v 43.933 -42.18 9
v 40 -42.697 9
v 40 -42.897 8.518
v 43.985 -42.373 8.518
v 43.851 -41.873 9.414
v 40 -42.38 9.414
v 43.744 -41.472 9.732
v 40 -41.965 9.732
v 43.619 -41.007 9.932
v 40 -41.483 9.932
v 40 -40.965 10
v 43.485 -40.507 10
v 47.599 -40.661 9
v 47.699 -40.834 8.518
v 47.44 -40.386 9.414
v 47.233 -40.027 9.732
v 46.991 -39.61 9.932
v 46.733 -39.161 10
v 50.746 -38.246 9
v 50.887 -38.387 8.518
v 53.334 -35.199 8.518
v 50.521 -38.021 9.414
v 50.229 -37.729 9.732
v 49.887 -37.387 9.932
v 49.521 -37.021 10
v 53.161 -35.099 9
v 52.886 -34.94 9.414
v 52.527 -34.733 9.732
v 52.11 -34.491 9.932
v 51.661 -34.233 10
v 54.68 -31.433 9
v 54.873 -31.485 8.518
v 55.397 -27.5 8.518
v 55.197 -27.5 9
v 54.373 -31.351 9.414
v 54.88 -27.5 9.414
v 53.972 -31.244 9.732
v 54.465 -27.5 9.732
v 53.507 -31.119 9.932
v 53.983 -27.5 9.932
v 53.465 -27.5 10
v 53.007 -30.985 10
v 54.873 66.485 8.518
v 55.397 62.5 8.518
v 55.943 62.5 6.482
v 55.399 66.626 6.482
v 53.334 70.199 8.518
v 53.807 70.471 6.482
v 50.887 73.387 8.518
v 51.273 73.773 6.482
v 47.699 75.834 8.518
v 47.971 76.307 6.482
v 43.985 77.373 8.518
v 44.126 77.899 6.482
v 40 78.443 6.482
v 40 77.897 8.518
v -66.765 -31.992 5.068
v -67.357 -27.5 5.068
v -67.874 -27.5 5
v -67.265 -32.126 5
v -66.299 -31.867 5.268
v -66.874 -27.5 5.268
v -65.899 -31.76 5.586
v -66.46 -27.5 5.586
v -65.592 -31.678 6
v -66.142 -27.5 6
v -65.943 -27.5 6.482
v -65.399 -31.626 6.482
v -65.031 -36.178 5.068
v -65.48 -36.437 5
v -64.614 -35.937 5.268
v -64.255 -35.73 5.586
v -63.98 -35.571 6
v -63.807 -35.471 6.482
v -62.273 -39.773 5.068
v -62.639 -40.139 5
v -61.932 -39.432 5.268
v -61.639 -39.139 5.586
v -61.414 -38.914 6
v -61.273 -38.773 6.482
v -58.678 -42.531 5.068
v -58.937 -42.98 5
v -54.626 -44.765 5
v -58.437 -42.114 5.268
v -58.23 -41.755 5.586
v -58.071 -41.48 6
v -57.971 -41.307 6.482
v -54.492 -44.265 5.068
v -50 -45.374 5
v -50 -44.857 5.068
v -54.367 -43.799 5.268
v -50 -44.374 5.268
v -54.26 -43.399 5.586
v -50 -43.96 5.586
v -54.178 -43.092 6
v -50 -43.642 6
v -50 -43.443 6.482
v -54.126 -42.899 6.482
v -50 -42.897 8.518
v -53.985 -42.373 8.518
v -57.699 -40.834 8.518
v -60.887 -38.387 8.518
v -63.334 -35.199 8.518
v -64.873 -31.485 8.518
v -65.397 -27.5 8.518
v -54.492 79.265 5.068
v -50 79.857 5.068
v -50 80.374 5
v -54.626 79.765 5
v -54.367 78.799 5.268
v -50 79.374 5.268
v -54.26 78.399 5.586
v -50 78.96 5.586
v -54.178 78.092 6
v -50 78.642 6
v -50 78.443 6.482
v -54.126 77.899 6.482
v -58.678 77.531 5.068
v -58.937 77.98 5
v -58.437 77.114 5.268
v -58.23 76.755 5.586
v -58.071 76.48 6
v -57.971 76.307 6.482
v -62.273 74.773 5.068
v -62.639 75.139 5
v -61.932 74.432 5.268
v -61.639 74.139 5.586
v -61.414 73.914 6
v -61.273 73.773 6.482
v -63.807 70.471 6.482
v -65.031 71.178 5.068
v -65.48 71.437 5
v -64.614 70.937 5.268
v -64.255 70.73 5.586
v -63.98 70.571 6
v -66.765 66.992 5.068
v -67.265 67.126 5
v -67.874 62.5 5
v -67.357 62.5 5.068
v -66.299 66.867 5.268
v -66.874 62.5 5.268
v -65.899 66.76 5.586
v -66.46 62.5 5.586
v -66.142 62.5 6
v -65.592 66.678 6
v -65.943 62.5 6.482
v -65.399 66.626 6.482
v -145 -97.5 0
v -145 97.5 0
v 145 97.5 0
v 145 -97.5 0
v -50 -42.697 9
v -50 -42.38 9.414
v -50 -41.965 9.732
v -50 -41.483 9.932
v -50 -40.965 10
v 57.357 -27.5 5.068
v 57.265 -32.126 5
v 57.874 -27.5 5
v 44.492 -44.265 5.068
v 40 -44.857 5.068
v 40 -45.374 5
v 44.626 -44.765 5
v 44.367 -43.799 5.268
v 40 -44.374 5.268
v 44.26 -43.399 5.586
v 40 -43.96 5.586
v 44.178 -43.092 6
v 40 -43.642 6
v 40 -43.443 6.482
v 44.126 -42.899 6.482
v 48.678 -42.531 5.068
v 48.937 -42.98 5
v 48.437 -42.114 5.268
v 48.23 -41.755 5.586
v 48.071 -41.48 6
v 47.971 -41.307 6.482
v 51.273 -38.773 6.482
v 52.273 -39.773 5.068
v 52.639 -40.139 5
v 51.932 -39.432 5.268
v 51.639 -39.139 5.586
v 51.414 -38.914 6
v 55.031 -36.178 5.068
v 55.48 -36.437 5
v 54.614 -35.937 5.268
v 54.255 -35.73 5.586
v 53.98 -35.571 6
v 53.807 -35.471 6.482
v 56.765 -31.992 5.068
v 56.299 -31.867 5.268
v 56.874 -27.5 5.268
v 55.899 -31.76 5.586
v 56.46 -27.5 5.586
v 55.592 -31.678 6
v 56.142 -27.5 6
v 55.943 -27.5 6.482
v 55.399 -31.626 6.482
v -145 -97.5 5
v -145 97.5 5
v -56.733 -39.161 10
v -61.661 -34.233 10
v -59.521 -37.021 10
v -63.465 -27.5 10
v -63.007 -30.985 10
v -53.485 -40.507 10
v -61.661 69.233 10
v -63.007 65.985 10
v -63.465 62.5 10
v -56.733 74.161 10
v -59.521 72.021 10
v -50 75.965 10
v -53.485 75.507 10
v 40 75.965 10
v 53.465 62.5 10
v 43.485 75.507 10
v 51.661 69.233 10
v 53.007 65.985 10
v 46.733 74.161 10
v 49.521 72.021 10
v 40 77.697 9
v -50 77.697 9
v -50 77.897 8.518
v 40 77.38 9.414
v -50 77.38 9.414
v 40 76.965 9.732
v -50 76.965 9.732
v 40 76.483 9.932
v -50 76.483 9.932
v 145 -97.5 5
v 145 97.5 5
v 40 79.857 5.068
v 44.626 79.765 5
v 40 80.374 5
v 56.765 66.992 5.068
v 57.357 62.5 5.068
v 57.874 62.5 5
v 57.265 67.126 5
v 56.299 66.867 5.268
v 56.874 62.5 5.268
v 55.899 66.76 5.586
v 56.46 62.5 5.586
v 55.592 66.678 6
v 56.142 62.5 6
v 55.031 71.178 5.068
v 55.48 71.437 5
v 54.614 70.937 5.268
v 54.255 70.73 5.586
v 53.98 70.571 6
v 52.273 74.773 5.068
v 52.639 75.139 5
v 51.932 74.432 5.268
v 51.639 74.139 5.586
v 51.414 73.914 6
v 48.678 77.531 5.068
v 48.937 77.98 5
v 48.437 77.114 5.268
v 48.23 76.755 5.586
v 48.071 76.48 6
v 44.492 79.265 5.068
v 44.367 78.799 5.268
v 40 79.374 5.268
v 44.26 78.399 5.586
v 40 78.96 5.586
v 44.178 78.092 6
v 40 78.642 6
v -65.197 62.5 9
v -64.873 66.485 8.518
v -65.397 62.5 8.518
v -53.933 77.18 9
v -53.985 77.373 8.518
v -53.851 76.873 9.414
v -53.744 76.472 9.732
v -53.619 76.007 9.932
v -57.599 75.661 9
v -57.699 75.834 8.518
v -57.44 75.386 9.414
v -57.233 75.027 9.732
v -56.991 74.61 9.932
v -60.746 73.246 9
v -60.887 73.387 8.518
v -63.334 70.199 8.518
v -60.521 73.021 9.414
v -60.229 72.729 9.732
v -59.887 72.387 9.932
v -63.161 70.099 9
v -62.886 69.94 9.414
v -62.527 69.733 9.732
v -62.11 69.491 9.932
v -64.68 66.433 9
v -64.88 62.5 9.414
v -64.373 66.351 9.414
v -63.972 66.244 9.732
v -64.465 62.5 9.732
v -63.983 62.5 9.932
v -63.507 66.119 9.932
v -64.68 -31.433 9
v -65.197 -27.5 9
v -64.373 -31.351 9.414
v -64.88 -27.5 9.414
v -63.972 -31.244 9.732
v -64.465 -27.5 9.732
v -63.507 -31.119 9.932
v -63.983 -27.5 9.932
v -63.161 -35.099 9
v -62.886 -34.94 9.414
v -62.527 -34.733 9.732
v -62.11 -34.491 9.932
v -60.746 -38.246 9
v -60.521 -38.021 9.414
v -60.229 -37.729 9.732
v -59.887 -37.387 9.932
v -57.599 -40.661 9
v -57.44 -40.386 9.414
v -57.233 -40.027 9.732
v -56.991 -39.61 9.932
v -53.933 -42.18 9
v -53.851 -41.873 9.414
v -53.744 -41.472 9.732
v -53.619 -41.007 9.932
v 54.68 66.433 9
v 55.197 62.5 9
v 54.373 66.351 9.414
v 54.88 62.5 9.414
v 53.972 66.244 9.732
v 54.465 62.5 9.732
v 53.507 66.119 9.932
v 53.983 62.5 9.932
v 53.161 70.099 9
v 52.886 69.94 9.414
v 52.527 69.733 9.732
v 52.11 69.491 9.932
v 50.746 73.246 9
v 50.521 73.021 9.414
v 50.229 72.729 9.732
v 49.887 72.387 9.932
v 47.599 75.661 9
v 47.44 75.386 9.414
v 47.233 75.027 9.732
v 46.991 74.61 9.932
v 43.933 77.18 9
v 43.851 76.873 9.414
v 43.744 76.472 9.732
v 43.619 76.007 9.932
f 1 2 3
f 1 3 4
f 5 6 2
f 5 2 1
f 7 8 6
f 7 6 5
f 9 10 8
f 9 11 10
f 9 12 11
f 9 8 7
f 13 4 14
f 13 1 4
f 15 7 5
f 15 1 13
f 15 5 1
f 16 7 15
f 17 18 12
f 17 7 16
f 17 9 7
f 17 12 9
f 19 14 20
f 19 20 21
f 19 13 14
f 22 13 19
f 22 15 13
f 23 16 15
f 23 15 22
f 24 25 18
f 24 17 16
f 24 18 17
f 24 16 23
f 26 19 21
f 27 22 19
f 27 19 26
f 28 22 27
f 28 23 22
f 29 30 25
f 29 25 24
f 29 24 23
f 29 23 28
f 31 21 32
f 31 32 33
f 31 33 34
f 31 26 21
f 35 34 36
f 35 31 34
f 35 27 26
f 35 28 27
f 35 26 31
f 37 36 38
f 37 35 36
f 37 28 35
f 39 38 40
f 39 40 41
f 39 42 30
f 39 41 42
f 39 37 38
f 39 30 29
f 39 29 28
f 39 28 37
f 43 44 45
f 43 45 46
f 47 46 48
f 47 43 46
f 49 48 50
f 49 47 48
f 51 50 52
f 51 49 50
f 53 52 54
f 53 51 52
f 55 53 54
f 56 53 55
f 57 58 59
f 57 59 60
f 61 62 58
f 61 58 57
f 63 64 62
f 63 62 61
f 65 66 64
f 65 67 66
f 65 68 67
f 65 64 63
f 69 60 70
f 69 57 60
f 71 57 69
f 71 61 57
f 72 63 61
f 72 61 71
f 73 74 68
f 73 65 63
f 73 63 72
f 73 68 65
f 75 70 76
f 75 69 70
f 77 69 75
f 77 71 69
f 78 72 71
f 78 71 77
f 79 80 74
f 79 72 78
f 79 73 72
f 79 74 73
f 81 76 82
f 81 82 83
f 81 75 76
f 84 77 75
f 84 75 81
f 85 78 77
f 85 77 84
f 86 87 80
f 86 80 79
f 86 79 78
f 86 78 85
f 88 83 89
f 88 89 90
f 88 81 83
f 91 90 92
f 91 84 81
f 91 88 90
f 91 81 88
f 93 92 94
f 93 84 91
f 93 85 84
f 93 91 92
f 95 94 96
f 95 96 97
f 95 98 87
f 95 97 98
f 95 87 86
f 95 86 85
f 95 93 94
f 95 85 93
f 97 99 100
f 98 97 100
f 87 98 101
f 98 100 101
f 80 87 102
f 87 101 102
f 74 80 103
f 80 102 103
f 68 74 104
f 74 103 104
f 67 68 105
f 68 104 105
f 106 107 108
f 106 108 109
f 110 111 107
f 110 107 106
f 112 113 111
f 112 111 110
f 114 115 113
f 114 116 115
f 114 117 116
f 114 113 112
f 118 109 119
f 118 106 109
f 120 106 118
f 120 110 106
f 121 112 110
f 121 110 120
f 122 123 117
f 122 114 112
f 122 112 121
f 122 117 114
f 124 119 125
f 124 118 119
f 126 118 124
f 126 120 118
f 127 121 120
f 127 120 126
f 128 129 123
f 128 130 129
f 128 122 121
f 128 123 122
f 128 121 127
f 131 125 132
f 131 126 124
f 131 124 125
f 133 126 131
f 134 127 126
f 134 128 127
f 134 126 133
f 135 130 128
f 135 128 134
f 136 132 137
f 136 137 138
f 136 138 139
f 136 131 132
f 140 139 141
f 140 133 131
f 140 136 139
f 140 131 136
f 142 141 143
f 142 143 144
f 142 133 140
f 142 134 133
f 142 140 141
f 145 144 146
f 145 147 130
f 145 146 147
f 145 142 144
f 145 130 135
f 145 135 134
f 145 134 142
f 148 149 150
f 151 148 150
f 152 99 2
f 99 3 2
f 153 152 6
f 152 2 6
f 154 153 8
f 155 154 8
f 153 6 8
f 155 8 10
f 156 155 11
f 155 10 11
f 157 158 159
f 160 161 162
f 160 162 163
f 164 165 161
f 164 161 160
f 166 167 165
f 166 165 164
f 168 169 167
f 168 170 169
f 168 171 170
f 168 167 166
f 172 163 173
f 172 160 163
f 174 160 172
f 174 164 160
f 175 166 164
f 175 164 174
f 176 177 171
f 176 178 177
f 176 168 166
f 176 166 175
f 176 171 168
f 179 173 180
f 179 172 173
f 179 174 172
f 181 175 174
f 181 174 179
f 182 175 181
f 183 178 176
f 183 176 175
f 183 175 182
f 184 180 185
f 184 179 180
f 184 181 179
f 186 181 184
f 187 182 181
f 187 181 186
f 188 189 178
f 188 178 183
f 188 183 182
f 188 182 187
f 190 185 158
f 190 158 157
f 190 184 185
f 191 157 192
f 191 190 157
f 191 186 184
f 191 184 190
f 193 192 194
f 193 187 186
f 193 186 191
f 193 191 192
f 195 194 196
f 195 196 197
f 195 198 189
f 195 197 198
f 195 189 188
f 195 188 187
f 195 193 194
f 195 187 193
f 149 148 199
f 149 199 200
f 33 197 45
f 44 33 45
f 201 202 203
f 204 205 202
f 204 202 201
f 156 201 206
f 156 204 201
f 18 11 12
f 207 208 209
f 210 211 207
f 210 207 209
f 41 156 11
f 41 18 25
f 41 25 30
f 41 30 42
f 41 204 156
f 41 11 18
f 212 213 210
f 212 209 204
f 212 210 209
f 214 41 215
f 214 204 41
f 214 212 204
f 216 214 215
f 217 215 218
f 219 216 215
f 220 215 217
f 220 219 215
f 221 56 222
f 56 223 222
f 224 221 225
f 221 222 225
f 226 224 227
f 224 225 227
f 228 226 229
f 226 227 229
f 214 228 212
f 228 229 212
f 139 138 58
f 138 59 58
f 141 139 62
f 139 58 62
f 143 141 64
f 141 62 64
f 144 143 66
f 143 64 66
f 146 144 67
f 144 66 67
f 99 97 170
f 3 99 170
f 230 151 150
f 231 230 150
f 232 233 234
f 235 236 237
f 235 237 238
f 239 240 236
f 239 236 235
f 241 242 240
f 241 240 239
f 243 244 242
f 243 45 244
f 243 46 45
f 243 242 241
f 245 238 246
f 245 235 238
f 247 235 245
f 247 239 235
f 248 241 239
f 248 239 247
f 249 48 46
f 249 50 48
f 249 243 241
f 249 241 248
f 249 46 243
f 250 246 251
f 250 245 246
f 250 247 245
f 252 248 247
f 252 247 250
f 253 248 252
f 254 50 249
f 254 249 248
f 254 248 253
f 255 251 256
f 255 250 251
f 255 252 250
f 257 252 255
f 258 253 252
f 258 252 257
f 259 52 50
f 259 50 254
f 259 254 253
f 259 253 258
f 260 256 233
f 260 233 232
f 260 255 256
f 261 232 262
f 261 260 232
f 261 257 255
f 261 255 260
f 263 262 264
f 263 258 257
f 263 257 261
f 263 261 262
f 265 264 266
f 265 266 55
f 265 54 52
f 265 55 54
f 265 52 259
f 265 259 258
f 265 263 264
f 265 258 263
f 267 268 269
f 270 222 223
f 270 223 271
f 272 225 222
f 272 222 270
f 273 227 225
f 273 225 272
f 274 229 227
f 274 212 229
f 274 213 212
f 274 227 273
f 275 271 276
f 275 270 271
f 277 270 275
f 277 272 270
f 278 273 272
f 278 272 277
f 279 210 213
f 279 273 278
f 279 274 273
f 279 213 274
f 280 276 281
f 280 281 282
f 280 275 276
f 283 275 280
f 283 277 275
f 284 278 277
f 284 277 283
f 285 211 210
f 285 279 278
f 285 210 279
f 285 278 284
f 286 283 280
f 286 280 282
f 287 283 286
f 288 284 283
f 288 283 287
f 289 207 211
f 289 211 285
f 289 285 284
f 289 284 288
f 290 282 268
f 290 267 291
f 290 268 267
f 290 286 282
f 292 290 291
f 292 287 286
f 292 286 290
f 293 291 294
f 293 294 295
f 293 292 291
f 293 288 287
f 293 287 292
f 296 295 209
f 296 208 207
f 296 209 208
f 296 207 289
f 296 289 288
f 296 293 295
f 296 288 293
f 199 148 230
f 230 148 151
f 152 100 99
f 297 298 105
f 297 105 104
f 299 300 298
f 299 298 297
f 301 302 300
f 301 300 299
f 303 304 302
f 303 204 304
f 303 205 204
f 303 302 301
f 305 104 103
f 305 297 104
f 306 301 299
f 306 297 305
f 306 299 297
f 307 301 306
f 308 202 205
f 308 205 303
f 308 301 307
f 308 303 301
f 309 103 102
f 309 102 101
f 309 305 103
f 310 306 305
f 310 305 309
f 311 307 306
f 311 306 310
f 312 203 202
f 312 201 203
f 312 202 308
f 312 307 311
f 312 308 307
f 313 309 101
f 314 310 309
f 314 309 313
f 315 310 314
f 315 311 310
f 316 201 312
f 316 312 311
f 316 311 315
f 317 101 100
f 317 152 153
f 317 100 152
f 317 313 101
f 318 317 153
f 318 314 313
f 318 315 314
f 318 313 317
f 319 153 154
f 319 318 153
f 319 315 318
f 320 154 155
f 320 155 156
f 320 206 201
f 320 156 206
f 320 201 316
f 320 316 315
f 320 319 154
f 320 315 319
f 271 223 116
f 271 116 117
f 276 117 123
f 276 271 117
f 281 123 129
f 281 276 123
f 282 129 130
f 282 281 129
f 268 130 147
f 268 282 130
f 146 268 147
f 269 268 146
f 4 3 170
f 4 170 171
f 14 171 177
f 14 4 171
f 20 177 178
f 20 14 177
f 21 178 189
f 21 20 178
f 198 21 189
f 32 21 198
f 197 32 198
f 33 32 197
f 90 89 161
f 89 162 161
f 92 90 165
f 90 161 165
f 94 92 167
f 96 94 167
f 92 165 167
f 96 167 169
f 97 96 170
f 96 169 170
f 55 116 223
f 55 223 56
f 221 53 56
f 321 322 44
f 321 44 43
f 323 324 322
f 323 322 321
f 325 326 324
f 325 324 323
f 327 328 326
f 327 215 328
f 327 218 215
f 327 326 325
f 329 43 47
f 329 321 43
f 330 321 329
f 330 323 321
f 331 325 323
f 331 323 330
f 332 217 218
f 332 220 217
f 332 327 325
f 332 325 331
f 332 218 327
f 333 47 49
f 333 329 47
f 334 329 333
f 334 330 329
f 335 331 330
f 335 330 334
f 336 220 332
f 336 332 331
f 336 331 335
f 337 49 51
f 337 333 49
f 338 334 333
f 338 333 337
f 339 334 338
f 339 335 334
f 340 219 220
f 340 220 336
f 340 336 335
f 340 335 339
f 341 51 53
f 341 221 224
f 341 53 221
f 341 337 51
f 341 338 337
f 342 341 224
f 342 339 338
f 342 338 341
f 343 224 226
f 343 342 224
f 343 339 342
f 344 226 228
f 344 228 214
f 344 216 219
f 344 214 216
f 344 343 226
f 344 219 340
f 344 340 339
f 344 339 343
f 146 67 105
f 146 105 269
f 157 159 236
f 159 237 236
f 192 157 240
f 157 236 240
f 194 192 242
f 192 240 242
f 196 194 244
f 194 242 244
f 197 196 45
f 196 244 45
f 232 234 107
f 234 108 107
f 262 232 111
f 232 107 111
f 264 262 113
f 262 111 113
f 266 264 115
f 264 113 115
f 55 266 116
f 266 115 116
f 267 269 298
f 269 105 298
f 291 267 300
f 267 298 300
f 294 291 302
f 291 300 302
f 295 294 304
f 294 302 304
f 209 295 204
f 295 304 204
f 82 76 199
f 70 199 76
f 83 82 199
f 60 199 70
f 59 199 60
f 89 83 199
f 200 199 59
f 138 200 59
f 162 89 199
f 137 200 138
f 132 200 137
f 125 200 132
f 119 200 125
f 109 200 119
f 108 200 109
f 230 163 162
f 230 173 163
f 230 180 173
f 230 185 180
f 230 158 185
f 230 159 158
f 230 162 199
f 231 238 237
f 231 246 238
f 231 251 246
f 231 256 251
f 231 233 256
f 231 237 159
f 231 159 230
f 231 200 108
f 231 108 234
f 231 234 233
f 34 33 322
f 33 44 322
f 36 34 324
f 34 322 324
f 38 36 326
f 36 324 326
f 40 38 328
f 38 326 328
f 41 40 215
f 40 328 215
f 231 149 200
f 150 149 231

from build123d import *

# Parameters (mm, degrees)
SKETCH_1_W      = 290
SKETCH_1_H      = 195
EXTRUDE_1_DEPTH = 5
SKETCH_2_W      = 120
SKETCH_2_H      = 120
EXTRUDE_2_DEPTH = 5
FILLET_1_R      = 15
DRAFT_1_ANGLE   = 15
FILLET_2_R      = 2


with BuildPart() as part:
    # 草图1 → 凸台-拉伸1 (new body)
    with BuildSketch(Plane.XY):
        Rectangle(SKETCH_1_W, SKETCH_1_H)
    extrude(amount=EXTRUDE_1_DEPTH)

    # 草图2 → 凸台-拉伸2 (add)
    with BuildSketch(Plane.XY.offset(5)):
        with Locations((-5, 17.5)):
            Rectangle(SKETCH_2_W, SKETCH_2_H)
    extrude(amount=EXTRUDE_2_DEPTH)

    # 圆角1
    fillet_1_edges = [part.edges().sort_by_distance(p)[0] for p in [
        (-65, 77.5, 7.5),
        (-65, -42.5, 7.5),
        (55, -42.5, 7.5),
        (55, 77.5, 7.5),
    ]]
    fillet(fillet_1_edges, radius=FILLET_1_R)

    # 拔模1
    draft_1_faces = [part.faces().sort_by_distance(p)[0] for p in [
        (-65, 17.5, 7.5),
        (-60.606601718, 73.106601718, 7.5),
        (-5, 77.5, 7.5),
        (50.606601718, 73.106601718, 7.5),
        (55, 17.5, 7.5),
        (50.606601718, -38.106601718, 7.5),
        (-5, -42.5, 7.5),
        (-60.606601718, -38.106601718, 7.5),
    ]]
    draft(draft_1_faces, Plane.XY.offset(10), DRAFT_1_ANGLE)

    # 圆角2
    fillet_2_edges = [part.edges().sort_by_distance(p)[0] for p in [
        (-5, -43.839745962, 5),
        (-5, -42.5, 10),
        (-66.339745962, 17.5, 5),
        (-65, 17.5, 10),
        (55, 17.5, 10),
        (-5, 77.5, 10),
        (50.606601718, 73.106601718, 10),
        (-60.606601718, 73.106601718, 10),
        (50.606601718, -38.106601718, 10),
        (-60.606601718, -38.106601718, 10),
        (56.339745962, 17.5, 5),
        (-5, 78.839745962, 5),
        (-61.553945173, -39.053945173, 5),
        (51.553945173, -39.053945173, 5),
        (-61.553945173, 74.053945173, 5),
        (51.553945173, 74.053945173, 5),
    ]]
    fillet(fillet_2_edges, radius=FILLET_2_R)


solid = part.part
